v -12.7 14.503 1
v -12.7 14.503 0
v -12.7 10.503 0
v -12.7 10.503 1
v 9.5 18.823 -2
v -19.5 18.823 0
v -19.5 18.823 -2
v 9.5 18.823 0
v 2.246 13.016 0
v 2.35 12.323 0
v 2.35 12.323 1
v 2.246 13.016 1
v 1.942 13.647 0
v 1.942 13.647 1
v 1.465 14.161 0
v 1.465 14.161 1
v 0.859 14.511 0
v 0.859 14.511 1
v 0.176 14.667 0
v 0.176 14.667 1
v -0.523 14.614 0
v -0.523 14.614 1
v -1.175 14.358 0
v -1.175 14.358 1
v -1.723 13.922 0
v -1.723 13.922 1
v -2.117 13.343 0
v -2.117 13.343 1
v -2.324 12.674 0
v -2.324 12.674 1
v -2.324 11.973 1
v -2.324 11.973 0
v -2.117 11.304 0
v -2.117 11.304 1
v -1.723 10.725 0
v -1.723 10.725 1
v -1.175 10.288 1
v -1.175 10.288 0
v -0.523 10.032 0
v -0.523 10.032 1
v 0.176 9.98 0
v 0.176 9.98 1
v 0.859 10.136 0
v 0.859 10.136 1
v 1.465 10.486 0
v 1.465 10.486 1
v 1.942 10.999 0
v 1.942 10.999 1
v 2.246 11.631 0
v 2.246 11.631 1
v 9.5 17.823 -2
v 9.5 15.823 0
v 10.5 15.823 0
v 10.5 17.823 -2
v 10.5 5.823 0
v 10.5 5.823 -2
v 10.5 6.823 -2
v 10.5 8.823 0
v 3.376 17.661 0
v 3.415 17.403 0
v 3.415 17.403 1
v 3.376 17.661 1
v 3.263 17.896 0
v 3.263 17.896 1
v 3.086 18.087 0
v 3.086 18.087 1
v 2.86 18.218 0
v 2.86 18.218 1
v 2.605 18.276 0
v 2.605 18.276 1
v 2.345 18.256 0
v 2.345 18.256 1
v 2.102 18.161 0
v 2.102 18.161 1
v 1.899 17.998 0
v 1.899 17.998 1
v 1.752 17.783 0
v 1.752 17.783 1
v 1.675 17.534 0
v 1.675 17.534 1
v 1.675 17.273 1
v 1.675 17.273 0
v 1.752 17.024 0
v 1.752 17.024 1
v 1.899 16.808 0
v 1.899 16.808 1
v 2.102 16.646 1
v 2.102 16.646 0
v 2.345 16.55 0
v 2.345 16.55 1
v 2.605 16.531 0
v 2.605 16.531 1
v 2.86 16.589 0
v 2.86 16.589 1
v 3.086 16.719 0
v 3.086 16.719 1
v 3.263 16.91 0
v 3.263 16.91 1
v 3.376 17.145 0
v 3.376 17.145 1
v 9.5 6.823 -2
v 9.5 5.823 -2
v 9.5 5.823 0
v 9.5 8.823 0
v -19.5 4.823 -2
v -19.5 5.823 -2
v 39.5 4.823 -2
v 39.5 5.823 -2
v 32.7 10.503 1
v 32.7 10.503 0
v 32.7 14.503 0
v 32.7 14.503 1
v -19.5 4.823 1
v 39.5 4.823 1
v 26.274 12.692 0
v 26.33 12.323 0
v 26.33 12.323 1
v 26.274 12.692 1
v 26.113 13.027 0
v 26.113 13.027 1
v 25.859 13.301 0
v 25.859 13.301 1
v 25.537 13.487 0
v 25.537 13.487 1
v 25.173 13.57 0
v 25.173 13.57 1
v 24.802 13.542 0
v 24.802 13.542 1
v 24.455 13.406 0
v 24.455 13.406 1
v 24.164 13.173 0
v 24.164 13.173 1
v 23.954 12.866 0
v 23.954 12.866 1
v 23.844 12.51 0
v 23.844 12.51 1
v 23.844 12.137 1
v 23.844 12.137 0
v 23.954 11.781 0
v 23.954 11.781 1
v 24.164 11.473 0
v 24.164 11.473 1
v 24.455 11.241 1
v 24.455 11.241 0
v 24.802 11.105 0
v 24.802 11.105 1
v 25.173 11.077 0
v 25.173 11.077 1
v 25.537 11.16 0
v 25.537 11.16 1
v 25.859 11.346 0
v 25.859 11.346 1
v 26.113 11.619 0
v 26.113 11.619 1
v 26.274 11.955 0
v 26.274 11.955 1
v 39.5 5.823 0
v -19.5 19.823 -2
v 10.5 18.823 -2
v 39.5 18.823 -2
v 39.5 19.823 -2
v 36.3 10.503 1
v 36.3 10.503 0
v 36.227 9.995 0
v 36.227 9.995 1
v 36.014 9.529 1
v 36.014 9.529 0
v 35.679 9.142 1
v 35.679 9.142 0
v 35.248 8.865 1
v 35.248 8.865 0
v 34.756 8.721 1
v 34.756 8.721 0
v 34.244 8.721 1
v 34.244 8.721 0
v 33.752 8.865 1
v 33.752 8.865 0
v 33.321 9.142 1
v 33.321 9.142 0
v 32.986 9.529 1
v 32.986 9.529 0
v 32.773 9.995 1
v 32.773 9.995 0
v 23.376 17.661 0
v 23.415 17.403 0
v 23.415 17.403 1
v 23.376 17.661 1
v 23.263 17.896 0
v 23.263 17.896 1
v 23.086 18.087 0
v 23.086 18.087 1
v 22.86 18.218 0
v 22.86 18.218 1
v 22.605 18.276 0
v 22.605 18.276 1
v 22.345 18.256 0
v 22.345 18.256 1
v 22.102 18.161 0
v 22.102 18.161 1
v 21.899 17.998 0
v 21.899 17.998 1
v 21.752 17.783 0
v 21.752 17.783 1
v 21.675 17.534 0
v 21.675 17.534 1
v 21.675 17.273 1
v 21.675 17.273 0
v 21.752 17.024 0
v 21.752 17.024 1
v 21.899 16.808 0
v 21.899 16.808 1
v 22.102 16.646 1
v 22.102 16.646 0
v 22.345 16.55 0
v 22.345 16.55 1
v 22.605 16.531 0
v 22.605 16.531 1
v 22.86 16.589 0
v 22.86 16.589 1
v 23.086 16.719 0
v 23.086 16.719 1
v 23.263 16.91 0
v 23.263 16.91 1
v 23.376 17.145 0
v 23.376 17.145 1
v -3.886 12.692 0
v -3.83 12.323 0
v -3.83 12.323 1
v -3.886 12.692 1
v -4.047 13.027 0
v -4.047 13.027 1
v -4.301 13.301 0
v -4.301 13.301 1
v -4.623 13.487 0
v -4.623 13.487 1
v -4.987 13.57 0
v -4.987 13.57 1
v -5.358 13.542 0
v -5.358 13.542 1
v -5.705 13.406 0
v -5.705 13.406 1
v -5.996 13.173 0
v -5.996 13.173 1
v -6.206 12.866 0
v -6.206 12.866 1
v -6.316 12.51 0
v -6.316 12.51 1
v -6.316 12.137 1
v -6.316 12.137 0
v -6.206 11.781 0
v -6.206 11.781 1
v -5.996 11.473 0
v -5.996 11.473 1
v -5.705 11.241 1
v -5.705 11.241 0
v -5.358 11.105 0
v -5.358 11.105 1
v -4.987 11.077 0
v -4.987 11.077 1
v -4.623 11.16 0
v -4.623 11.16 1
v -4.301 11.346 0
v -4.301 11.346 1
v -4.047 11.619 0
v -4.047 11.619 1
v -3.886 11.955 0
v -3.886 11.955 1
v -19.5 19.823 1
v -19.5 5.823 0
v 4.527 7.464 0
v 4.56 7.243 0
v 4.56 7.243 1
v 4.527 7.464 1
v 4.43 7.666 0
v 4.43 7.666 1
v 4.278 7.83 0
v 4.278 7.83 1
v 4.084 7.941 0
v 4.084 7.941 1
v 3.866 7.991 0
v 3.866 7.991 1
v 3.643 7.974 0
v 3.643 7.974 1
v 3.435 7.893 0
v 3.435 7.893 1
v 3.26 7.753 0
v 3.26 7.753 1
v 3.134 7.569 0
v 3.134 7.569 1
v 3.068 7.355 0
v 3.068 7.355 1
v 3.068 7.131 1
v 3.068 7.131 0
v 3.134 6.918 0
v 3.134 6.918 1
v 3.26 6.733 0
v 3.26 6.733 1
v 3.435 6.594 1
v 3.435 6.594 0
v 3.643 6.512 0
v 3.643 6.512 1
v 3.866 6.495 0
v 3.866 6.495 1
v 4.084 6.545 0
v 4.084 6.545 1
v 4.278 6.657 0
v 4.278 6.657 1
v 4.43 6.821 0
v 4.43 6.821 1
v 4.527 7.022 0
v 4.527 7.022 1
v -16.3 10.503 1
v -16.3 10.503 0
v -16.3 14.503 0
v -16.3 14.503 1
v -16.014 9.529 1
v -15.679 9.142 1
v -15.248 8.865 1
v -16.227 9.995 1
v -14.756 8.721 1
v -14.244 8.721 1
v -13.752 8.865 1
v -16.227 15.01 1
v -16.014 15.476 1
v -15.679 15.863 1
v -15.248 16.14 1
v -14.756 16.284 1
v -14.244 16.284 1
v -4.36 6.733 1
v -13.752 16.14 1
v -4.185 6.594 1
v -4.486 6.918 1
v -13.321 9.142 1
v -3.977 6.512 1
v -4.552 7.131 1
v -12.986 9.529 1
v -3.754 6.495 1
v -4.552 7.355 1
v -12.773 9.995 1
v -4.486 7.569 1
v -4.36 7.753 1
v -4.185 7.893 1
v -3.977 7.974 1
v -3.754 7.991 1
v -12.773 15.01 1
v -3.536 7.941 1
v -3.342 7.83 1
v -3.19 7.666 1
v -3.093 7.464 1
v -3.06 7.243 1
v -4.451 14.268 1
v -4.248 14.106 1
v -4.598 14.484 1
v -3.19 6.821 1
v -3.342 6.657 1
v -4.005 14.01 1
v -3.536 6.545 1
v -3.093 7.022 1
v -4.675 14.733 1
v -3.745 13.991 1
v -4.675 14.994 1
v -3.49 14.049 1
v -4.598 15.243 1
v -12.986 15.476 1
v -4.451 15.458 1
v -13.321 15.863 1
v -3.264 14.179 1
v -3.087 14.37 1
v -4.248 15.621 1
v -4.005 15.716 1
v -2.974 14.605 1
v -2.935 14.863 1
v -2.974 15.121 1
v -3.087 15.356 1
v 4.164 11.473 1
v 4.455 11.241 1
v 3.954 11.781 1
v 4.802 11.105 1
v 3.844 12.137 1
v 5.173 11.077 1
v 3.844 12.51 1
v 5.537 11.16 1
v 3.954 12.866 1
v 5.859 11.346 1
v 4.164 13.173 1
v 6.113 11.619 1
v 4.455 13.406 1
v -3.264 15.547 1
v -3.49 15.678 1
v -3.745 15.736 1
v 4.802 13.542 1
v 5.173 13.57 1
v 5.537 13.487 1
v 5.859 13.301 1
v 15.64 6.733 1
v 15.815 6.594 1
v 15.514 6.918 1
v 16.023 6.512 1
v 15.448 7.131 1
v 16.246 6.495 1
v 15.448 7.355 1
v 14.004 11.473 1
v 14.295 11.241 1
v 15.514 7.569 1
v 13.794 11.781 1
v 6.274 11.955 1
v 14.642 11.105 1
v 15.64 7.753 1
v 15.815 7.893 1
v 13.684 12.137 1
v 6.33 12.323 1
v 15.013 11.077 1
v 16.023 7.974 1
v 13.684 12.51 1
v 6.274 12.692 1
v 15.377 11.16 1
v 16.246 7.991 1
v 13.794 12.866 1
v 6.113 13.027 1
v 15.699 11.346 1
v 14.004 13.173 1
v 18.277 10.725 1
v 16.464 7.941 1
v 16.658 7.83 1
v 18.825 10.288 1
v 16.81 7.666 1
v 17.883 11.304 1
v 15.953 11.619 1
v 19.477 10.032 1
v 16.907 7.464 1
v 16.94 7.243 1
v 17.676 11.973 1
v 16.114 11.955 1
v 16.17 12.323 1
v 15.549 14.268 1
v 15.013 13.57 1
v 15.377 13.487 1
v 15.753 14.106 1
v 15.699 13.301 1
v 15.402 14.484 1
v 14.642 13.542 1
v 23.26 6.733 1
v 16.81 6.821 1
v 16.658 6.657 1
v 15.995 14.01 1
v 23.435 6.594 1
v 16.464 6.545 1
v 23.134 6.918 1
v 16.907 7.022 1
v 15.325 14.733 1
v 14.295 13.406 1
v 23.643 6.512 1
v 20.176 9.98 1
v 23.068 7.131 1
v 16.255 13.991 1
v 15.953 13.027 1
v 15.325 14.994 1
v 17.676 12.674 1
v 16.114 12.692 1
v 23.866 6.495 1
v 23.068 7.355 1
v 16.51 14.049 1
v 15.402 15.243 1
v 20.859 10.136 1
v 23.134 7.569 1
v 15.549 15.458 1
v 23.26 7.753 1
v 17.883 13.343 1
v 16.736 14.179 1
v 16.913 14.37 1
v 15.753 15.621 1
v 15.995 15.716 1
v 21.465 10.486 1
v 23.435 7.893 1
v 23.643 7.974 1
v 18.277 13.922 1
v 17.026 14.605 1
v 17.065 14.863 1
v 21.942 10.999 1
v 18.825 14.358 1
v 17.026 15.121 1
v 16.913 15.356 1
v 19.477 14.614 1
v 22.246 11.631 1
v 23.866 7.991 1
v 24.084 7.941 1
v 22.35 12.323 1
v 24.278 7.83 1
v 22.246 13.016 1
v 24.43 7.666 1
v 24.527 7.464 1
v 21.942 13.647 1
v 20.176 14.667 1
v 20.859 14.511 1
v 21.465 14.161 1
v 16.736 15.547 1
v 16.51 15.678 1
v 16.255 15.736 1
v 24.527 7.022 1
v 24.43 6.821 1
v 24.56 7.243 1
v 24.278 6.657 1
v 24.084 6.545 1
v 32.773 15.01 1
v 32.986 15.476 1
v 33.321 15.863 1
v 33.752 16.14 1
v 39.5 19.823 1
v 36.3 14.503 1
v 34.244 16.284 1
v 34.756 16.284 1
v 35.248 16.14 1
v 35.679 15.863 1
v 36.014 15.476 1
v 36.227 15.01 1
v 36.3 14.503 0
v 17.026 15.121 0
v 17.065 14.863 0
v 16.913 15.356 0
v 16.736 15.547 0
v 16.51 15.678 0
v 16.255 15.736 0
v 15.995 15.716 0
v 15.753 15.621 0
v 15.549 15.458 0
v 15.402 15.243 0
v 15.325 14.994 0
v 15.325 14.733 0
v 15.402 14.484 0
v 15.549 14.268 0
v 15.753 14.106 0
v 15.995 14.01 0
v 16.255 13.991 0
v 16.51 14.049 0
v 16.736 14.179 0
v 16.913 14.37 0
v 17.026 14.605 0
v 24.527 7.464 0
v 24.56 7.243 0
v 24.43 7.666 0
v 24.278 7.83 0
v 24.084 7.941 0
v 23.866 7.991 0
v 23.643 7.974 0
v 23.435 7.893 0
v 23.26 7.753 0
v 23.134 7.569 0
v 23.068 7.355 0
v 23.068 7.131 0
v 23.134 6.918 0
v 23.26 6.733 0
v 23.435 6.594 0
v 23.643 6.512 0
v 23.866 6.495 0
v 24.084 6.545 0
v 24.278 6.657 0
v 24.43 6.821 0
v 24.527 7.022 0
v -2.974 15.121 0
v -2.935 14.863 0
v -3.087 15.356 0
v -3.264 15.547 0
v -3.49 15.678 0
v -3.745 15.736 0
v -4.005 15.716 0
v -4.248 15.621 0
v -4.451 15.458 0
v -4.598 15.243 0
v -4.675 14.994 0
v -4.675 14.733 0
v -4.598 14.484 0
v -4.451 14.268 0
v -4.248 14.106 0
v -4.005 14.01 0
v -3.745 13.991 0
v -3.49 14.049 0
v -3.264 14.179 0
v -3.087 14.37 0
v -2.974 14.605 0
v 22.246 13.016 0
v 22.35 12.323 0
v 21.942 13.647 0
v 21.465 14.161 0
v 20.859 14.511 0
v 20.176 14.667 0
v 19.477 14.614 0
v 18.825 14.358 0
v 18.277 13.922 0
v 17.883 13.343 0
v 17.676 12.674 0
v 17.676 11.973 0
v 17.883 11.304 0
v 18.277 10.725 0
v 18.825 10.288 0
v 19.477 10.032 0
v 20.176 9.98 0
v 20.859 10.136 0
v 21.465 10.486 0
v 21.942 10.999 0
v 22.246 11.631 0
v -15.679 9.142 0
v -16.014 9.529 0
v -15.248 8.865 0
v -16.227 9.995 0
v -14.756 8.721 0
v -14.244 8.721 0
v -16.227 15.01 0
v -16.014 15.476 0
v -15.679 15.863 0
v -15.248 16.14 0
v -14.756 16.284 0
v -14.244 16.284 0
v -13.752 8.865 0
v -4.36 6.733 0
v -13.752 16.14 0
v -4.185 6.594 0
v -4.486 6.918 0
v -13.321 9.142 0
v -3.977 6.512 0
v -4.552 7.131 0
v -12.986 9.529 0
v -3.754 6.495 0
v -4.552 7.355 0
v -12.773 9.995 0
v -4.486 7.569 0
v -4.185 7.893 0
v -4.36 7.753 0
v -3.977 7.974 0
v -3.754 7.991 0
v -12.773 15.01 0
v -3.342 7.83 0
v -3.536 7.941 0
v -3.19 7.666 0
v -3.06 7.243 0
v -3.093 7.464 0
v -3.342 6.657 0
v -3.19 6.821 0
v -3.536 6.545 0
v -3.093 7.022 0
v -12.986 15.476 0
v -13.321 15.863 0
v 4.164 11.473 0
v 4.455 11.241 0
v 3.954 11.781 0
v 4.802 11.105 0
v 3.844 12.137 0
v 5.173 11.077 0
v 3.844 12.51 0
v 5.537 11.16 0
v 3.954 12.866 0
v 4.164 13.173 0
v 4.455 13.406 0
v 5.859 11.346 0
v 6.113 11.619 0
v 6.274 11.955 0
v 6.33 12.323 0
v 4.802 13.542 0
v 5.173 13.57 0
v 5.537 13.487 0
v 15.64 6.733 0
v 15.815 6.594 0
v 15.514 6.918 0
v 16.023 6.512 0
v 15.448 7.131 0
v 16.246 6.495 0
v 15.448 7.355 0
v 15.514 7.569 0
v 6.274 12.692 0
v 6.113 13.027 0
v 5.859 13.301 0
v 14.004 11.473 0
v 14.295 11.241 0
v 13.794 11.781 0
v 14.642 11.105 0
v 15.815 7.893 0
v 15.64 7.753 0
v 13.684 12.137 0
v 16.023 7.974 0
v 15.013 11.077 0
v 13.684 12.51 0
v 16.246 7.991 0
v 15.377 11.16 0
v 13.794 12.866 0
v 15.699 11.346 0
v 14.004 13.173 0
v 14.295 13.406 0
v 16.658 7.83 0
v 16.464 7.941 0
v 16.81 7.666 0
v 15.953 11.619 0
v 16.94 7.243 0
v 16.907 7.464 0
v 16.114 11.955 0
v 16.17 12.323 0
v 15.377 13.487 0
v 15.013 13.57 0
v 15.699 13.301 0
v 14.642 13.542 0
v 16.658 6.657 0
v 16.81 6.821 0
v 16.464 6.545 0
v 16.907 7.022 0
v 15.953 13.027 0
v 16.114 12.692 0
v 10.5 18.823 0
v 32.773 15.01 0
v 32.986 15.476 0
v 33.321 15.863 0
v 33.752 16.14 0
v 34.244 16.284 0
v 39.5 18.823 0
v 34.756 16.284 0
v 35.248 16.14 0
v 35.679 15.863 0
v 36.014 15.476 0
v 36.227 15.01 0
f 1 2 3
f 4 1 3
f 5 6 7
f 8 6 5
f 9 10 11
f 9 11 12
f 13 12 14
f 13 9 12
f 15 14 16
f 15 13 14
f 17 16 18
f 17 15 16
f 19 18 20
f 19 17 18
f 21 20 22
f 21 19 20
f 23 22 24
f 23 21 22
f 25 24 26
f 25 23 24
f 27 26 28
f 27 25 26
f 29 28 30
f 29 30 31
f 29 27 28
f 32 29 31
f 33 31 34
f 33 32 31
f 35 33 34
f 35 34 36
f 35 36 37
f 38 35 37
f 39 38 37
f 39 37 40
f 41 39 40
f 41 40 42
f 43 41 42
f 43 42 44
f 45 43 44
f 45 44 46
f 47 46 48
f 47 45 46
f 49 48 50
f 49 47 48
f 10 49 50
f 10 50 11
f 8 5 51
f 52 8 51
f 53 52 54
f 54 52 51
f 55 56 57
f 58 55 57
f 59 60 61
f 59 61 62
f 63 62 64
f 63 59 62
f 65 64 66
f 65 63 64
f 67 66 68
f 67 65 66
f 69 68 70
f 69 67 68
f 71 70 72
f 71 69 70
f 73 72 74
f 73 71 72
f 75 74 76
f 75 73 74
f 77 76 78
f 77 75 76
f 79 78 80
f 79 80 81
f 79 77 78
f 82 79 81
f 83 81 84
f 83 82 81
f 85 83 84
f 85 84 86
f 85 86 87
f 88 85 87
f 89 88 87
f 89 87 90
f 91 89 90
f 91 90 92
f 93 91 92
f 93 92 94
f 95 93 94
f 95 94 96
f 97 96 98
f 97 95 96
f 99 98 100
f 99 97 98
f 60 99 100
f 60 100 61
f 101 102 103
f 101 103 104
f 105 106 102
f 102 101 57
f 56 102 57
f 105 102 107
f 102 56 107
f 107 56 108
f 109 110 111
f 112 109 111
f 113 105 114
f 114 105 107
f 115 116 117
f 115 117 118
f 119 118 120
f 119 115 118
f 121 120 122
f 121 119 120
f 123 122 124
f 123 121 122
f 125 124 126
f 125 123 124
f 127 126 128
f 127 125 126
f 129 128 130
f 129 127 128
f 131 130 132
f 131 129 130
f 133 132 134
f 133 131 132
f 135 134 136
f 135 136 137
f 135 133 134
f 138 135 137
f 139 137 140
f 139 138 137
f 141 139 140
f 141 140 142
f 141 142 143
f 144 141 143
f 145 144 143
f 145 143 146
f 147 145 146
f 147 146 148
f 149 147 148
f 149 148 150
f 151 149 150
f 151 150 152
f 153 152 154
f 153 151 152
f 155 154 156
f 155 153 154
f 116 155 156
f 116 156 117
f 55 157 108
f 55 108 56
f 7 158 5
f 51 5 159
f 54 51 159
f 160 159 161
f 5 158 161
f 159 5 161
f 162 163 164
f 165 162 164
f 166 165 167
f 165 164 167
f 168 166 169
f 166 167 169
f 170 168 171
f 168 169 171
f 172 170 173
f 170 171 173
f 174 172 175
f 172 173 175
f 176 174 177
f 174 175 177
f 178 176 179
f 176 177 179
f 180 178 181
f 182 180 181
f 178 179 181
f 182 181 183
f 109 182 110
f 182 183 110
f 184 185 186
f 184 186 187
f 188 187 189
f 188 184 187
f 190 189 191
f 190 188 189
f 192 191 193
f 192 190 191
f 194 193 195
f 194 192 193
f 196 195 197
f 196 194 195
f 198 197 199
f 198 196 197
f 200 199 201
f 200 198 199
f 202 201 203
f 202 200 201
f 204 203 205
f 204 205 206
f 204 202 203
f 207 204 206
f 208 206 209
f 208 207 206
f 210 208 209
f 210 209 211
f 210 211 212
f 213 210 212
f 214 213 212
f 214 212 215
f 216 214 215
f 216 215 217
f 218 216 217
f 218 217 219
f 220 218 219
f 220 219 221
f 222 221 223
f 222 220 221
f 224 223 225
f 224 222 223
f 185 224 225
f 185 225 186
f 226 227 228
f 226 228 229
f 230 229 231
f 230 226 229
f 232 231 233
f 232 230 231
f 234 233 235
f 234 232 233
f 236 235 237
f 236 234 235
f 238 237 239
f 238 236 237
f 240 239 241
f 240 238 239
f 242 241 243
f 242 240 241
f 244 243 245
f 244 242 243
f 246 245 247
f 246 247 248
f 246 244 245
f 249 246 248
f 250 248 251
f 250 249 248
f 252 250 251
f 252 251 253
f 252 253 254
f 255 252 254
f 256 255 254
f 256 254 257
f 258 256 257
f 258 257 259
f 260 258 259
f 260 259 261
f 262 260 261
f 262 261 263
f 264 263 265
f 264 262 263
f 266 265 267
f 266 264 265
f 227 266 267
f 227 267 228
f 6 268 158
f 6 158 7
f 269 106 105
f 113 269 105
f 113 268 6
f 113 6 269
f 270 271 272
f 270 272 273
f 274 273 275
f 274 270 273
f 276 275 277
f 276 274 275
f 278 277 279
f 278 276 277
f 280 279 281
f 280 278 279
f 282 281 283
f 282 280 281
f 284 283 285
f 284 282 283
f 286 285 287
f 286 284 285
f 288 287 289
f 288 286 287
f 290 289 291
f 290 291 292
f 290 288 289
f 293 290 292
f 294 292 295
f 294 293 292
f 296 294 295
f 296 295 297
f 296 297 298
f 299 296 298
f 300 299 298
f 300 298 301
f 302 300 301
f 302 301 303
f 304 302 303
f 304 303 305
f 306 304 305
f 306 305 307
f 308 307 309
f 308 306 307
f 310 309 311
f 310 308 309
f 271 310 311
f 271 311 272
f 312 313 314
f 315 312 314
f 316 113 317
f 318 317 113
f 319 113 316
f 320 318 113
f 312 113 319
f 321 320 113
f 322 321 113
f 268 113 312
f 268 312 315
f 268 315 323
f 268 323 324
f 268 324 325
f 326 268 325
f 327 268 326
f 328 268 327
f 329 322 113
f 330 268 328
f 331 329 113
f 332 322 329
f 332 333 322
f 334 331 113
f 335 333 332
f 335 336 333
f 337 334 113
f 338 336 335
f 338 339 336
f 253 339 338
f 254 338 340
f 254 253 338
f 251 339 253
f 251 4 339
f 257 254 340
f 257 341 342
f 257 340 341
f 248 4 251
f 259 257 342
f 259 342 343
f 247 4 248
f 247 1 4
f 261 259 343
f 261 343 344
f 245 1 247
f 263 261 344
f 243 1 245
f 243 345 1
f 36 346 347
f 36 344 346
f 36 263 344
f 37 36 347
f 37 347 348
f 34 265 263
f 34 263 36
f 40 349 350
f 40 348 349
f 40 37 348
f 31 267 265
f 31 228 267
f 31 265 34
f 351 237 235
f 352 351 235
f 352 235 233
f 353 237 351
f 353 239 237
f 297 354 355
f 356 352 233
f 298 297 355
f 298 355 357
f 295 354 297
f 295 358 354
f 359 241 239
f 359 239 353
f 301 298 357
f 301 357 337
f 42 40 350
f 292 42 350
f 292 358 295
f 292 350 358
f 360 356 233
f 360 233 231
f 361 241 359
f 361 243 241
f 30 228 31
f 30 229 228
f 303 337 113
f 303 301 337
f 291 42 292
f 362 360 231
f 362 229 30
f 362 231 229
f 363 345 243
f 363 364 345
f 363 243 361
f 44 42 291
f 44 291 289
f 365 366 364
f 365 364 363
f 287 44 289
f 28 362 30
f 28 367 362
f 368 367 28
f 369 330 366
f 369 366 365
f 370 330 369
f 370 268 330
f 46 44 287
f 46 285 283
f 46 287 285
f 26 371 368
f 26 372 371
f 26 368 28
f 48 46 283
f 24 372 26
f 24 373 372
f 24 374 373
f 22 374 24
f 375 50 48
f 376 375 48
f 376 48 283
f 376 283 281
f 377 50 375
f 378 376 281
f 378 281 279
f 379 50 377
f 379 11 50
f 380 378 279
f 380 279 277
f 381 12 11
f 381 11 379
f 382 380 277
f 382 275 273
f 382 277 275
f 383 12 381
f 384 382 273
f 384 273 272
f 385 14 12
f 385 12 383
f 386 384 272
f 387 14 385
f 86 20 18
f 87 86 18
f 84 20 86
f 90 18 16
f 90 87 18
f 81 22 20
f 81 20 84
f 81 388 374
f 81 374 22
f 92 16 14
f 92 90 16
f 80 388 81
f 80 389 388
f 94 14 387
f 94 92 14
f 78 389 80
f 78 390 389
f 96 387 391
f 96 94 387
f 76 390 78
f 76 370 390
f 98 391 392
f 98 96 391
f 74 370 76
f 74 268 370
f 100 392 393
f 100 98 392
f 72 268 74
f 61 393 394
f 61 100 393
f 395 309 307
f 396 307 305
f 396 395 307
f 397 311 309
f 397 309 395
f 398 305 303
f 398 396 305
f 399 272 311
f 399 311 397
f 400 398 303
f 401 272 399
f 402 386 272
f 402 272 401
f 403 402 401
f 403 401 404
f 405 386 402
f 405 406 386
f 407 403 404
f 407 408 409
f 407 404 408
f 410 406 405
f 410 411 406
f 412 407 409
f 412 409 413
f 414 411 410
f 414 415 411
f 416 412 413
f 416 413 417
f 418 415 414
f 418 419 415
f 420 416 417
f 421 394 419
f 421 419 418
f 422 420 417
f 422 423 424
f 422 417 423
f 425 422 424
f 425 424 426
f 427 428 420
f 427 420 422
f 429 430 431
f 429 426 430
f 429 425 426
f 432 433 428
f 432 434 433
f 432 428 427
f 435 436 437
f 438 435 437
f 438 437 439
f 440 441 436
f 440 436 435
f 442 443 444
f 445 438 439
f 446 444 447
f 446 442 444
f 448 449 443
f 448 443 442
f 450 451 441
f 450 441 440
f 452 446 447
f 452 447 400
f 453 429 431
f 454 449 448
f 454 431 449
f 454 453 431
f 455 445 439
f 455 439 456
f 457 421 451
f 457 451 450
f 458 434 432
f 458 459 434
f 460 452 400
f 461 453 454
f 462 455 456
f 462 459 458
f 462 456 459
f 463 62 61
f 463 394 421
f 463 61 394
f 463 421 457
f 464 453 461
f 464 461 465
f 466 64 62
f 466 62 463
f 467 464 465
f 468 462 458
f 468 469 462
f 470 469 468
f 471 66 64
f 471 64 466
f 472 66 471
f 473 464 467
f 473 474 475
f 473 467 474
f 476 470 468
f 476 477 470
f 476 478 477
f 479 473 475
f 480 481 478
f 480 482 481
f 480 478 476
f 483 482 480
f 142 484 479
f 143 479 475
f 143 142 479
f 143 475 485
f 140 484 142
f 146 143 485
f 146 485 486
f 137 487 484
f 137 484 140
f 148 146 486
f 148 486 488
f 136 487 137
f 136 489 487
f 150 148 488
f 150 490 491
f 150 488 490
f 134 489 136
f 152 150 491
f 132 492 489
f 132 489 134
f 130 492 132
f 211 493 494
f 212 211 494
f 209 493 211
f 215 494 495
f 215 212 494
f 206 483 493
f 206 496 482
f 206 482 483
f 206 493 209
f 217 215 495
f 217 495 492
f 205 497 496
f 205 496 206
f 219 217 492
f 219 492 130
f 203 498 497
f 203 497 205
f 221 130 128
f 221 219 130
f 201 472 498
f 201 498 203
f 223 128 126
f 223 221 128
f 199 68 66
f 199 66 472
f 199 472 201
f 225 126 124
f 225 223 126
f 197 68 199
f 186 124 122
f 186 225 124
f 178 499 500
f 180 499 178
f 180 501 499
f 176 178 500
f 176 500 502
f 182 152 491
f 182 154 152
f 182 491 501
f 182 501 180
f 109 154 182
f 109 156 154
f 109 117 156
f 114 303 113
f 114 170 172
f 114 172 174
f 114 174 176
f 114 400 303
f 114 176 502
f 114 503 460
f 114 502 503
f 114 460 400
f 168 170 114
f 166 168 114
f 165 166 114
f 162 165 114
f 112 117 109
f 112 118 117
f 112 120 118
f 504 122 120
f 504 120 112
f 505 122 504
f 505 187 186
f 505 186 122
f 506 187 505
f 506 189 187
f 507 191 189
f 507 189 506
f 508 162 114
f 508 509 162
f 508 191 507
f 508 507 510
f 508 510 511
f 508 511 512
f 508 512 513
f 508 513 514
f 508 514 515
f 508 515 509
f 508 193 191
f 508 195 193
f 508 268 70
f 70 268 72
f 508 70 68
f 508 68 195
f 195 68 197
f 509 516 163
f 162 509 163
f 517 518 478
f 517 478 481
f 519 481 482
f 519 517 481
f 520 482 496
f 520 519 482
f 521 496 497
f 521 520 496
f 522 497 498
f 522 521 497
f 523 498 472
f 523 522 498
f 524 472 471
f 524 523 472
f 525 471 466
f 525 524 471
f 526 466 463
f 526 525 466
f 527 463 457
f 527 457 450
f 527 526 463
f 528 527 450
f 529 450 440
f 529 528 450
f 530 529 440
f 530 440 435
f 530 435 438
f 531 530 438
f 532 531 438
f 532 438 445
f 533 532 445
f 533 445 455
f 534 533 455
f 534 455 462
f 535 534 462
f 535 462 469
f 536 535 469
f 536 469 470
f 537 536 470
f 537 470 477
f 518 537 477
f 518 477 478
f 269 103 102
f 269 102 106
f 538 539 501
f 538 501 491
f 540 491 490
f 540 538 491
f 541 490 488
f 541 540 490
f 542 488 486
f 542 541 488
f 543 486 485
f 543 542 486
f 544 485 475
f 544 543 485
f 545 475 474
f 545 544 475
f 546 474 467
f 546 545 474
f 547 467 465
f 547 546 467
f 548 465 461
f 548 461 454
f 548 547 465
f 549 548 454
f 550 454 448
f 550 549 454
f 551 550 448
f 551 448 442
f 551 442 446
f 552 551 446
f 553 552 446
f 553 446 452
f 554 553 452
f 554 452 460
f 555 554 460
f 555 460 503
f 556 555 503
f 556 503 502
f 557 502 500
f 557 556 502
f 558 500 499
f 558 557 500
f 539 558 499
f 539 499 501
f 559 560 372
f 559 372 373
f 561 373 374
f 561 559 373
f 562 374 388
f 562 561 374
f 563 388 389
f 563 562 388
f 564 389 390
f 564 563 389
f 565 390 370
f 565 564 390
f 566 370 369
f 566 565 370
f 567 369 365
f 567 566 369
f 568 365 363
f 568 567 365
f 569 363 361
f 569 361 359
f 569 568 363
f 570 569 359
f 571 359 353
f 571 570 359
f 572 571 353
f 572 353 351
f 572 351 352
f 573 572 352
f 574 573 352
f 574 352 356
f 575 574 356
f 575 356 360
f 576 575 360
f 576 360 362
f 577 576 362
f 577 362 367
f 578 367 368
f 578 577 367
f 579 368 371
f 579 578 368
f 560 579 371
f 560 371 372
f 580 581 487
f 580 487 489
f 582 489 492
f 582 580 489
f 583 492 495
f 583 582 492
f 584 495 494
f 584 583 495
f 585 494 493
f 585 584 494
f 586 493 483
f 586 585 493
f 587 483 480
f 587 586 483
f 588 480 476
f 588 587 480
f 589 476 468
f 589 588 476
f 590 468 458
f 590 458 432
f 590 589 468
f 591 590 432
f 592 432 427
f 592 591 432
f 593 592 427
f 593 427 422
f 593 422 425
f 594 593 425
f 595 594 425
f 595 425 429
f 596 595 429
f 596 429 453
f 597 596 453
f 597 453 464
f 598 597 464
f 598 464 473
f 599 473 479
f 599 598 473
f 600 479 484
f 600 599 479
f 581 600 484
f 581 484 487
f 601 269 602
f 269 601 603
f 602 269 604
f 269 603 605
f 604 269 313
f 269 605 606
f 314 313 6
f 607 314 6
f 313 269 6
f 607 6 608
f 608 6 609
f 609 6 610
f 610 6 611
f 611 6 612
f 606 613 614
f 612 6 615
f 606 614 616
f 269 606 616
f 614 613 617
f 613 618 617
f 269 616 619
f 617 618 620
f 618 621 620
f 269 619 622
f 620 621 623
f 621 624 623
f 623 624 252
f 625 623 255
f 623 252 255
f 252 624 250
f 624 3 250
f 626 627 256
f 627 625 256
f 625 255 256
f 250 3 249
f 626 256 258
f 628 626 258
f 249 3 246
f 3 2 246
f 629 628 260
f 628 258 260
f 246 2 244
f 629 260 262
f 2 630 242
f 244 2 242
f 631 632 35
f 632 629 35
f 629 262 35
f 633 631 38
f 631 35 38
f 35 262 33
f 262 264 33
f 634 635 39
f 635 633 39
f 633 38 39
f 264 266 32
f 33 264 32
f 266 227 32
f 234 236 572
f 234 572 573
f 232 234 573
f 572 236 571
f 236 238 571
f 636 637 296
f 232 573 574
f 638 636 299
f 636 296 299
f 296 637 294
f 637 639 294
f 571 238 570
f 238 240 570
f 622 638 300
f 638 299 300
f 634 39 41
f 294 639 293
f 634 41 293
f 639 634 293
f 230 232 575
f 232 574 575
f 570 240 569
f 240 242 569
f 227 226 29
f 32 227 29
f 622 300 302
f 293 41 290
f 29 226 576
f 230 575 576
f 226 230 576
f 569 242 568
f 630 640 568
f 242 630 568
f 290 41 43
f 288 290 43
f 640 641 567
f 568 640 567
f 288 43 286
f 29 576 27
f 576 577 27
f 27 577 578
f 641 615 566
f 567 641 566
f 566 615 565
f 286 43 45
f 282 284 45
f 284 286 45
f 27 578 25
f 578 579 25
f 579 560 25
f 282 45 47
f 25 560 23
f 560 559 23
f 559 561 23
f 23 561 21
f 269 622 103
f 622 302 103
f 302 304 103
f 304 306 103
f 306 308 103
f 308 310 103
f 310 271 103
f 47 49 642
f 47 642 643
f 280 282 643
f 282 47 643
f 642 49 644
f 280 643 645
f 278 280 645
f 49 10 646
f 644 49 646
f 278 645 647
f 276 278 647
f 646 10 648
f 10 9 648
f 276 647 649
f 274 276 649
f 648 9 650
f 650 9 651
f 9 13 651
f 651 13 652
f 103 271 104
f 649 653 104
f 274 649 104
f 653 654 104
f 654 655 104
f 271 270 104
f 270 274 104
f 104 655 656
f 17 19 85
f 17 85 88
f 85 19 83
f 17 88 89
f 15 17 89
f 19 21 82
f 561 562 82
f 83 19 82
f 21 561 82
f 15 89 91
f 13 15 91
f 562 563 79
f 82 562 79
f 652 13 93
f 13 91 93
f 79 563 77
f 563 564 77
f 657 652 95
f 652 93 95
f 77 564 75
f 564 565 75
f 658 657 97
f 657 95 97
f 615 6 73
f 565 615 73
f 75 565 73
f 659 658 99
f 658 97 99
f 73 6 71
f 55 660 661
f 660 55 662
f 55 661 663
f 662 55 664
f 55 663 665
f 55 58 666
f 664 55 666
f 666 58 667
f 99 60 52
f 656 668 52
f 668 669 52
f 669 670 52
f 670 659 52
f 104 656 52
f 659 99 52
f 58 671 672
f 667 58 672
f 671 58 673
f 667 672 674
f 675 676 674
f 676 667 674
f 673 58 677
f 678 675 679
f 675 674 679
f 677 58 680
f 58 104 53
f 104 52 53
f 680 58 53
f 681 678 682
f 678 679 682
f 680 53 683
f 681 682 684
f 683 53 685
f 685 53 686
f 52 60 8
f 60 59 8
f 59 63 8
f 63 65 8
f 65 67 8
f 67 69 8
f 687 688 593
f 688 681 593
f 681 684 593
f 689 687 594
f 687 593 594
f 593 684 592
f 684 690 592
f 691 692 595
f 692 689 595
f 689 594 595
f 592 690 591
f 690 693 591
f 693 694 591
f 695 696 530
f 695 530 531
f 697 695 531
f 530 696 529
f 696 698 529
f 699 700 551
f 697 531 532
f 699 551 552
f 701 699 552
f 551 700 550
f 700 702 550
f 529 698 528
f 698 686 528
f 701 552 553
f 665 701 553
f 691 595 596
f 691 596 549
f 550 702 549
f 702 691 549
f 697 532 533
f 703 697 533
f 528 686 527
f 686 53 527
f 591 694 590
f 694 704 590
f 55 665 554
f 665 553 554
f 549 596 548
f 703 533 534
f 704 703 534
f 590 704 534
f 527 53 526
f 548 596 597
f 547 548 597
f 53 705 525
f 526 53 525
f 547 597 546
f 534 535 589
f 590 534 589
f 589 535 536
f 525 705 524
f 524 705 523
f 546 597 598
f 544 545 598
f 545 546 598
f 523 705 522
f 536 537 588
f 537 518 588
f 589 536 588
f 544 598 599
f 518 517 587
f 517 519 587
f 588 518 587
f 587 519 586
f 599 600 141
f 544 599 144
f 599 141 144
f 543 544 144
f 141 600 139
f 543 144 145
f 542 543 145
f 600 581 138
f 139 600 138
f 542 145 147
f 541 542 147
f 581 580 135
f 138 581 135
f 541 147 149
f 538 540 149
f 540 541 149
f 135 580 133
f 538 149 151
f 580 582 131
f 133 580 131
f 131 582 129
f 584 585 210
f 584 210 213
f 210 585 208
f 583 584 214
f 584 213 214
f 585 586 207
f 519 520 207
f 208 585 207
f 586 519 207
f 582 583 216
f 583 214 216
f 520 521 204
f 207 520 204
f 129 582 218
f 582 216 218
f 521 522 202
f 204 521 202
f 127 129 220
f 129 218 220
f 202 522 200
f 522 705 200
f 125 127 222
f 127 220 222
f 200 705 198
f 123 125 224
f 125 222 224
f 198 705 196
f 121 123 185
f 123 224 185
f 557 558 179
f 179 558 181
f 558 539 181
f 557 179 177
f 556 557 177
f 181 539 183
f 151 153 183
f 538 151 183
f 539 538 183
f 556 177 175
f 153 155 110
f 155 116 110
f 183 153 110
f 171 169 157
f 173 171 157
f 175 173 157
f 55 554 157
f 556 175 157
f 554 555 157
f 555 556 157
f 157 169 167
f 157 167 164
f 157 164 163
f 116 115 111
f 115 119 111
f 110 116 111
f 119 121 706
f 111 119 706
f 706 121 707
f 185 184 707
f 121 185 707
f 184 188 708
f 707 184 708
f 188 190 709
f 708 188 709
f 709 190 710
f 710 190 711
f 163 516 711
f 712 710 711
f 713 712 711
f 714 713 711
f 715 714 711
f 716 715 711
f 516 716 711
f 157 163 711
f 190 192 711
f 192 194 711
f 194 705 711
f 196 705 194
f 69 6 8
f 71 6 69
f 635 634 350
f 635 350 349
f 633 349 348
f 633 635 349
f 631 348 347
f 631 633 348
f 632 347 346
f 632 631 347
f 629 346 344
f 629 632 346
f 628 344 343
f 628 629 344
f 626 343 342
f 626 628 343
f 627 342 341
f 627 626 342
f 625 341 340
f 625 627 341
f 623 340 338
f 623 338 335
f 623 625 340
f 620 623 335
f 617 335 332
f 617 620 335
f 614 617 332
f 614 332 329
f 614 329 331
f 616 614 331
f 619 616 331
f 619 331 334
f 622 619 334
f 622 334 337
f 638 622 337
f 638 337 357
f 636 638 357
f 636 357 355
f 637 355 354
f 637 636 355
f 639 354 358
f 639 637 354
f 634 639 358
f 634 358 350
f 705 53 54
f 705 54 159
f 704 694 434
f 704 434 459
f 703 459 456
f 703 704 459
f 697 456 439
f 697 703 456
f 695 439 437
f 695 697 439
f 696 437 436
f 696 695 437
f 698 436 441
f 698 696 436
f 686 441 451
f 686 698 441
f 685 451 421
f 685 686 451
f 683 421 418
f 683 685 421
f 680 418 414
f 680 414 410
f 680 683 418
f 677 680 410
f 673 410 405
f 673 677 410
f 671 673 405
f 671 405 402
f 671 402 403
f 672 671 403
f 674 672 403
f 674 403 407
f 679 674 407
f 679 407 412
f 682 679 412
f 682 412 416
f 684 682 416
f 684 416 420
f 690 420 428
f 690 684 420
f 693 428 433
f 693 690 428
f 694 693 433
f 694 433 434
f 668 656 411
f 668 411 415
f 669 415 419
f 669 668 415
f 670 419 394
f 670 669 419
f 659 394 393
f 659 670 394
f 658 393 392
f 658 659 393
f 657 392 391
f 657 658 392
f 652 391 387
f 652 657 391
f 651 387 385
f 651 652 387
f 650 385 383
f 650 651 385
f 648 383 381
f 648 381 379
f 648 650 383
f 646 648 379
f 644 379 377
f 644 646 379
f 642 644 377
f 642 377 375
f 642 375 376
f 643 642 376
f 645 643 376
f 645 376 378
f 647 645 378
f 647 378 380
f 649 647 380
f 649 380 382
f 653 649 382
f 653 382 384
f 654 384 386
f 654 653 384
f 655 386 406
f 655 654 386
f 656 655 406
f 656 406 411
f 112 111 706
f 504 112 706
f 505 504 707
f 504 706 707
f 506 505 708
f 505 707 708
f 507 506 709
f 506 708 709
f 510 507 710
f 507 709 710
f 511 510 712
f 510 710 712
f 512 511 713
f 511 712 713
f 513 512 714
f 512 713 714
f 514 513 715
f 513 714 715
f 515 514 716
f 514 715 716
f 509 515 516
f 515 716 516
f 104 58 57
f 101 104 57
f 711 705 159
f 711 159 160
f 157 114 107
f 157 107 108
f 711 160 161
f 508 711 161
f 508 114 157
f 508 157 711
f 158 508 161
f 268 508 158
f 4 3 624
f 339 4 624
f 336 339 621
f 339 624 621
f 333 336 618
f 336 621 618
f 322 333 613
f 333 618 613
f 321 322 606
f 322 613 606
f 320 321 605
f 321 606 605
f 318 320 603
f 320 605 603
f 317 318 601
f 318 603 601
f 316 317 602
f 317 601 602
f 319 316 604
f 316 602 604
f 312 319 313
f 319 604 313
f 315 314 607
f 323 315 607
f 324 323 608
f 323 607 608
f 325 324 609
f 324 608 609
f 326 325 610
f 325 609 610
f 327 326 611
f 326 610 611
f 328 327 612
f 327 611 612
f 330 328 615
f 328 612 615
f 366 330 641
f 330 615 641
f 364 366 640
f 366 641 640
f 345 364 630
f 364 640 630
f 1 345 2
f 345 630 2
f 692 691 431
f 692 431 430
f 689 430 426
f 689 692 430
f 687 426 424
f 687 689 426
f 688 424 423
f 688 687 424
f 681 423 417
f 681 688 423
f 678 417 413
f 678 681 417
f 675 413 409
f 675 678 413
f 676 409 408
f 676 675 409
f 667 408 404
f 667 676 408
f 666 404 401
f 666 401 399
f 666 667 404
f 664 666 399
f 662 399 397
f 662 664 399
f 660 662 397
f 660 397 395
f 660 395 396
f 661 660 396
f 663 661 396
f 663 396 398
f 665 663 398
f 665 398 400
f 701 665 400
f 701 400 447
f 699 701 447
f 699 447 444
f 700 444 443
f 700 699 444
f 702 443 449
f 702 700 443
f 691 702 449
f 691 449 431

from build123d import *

# Parameters (mm, degrees)
F0_W        = 59
F0_H        = 15
F0_R        = 0.75
F0_R_2      = 1.25
F0_R_3      = 2.35
F0_R_4      = 0.875
F1_DEPTH    = 1
F2_W        = 0.5
F2_H        = 4
F3_DEPTH    = 3
F4_T4_DEPTH = 16.4300979278
F4_T9_DEPTH = 16.4300979278


# Not quite as in the source:
# - a fillet or chamfer that OpenCascade refuses, or shapes differently, is made with other operations: its cross-section is extruded or revolved along the edge and cut away or added


with BuildPart() as f1:
    # F0 (on Top) → F1 (new body)
    with BuildSketch(Plane.XY):
        with Locations((10, 12.3232733458)):
            Rectangle(F0_W, F0_H)
        with Locations((-3.81, 7.2432733458)):
            Circle(F0_R, mode=Mode.SUBTRACT)
        with Locations((3.81, 7.2432733458)):
            Circle(F0_R, mode=Mode.SUBTRACT)
        with Locations((-5.08, 12.3232733458)):
            Circle(F0_R_2, mode=Mode.SUBTRACT)
        with Locations((0, 12.3232733458)):
            Circle(F0_R_3, mode=Mode.SUBTRACT)
        with Locations((5.08, 12.3232733458)):
            Circle(F0_R_2, mode=Mode.SUBTRACT)
        with Locations((16.19, 7.2432733458)):
            Circle(F0_R, mode=Mode.SUBTRACT)
        with Locations((23.81, 7.2432733458)):
            Circle(F0_R, mode=Mode.SUBTRACT)
        with Locations((14.92, 12.3232733458)):
            Circle(F0_R_2, mode=Mode.SUBTRACT)
        with Locations((20, 12.3232733458)):
            Circle(F0_R_3, mode=Mode.SUBTRACT)
        with BuildLine():
            ThreePointArc((-16.3, 14.5025628582), (-14.5, 16.3025628582), (-12.7, 14.5025628582))
            Line((-12.7, 14.5025628582), (-12.7, 10.5025628582))
            ThreePointArc((-12.7, 10.5025628582), (-14.5, 8.7025628582), (-16.3, 10.5025628582))
            Line((-16.3, 10.5025628582), (-16.3, 14.5025628582))
        make_face(mode=Mode.SUBTRACT)
        with Locations((-3.81, 14.8632733458)):
            Circle(F0_R_4, mode=Mode.SUBTRACT)
        with Locations((2.54, 17.4032733458)):
            Circle(F0_R_4, mode=Mode.SUBTRACT)
        with Locations((16.19, 14.8632733458)):
            Circle(F0_R_4, mode=Mode.SUBTRACT)
        with Locations((25.08, 12.3232733458)):
            Circle(F0_R_2, mode=Mode.SUBTRACT)
        with BuildLine():
            ThreePointArc((36.3, 10.5025628582), (34.5, 8.7025628582), (32.7, 10.5025628582))
            Line((32.7, 10.5025628582), (32.7, 14.5025628582))
            ThreePointArc((32.7, 14.5025628582), (34.5, 16.3025628582), (36.3, 14.5025628582))
            Line((36.3, 14.5025628582), (36.3, 10.5025628582))
        make_face(mode=Mode.SUBTRACT)
        with Locations((22.54, 17.4032733458)):
            Circle(F0_R_4, mode=Mode.SUBTRACT)
    extrude(amount=F1_DEPTH)

    # F2 (on face) → F3 (join)
    with BuildSketch(Plane.XY.offset(1)):
        Polygon((39.5, 19.8232733458), (-19.5, 19.8232733458), (-19.5, 18.8232733458), (9.5, 18.8232733458), (10.5, 18.8232733458), (39.5, 18.8232733458), align=None)
        Polygon((9.5, 5.8232733458), (-19.5, 5.8232733458), (-19.5, 4.8232733458), (39.5, 4.8232733458), (39.5, 5.8232733458), (10.5, 5.8232733458), (10, 5.8232733458), align=None)
        with Locations((10.25, 7.8232733458)):
            Rectangle(F2_W, F2_H)
        Polygon((10.5, 18.8232733458), (9.5, 18.8232733458), (9.5, 14.8232733458), (10, 14.8232733458), (10.5, 14.8232733458), align=None)
        with Locations((9.75, 7.8232733458)):
            Rectangle(F2_W, F2_H)
    extrude(amount=-F3_DEPTH)

    # F4: chamfer of 3 on 2 edges, made by hand


with BuildPart() as f4_tool2:
    # F4_s3 → F4_t4 (new body)
    with BuildSketch(Plane.YZ.offset(18.2150489639)):
        Polygon((9.8232733458, 1), (6.8232733458, -2), (9.8232733458, -2), align=None)
    extrude(amount=-F4_T4_DEPTH)

    split(bisect_by=Plane.XY, keep=Keep.BOTTOM)


with BuildPart() as f1_1:
    add(f1.part)

    # F4_t1: cut F4_tool2
    add(f4_tool2.part, mode=Mode.SUBTRACT)


with BuildPart() as f4_tool7:
    # F4_s8 → F4_t9 (new body)
    with BuildSketch(Plane.YZ.offset(1.7849510361)):
        Polygon((14.8232733458, 1), (17.8232733458, -2), (14.8232733458, -2), align=None)
    extrude(amount=F4_T9_DEPTH)

    split(bisect_by=Plane.XY, keep=Keep.BOTTOM)


with BuildPart() as f1_2:
    add(f1_1.part)

    # F4_t6: cut F4_tool7
    add(f4_tool7.part, mode=Mode.SUBTRACT)


solid = f1_2.part
